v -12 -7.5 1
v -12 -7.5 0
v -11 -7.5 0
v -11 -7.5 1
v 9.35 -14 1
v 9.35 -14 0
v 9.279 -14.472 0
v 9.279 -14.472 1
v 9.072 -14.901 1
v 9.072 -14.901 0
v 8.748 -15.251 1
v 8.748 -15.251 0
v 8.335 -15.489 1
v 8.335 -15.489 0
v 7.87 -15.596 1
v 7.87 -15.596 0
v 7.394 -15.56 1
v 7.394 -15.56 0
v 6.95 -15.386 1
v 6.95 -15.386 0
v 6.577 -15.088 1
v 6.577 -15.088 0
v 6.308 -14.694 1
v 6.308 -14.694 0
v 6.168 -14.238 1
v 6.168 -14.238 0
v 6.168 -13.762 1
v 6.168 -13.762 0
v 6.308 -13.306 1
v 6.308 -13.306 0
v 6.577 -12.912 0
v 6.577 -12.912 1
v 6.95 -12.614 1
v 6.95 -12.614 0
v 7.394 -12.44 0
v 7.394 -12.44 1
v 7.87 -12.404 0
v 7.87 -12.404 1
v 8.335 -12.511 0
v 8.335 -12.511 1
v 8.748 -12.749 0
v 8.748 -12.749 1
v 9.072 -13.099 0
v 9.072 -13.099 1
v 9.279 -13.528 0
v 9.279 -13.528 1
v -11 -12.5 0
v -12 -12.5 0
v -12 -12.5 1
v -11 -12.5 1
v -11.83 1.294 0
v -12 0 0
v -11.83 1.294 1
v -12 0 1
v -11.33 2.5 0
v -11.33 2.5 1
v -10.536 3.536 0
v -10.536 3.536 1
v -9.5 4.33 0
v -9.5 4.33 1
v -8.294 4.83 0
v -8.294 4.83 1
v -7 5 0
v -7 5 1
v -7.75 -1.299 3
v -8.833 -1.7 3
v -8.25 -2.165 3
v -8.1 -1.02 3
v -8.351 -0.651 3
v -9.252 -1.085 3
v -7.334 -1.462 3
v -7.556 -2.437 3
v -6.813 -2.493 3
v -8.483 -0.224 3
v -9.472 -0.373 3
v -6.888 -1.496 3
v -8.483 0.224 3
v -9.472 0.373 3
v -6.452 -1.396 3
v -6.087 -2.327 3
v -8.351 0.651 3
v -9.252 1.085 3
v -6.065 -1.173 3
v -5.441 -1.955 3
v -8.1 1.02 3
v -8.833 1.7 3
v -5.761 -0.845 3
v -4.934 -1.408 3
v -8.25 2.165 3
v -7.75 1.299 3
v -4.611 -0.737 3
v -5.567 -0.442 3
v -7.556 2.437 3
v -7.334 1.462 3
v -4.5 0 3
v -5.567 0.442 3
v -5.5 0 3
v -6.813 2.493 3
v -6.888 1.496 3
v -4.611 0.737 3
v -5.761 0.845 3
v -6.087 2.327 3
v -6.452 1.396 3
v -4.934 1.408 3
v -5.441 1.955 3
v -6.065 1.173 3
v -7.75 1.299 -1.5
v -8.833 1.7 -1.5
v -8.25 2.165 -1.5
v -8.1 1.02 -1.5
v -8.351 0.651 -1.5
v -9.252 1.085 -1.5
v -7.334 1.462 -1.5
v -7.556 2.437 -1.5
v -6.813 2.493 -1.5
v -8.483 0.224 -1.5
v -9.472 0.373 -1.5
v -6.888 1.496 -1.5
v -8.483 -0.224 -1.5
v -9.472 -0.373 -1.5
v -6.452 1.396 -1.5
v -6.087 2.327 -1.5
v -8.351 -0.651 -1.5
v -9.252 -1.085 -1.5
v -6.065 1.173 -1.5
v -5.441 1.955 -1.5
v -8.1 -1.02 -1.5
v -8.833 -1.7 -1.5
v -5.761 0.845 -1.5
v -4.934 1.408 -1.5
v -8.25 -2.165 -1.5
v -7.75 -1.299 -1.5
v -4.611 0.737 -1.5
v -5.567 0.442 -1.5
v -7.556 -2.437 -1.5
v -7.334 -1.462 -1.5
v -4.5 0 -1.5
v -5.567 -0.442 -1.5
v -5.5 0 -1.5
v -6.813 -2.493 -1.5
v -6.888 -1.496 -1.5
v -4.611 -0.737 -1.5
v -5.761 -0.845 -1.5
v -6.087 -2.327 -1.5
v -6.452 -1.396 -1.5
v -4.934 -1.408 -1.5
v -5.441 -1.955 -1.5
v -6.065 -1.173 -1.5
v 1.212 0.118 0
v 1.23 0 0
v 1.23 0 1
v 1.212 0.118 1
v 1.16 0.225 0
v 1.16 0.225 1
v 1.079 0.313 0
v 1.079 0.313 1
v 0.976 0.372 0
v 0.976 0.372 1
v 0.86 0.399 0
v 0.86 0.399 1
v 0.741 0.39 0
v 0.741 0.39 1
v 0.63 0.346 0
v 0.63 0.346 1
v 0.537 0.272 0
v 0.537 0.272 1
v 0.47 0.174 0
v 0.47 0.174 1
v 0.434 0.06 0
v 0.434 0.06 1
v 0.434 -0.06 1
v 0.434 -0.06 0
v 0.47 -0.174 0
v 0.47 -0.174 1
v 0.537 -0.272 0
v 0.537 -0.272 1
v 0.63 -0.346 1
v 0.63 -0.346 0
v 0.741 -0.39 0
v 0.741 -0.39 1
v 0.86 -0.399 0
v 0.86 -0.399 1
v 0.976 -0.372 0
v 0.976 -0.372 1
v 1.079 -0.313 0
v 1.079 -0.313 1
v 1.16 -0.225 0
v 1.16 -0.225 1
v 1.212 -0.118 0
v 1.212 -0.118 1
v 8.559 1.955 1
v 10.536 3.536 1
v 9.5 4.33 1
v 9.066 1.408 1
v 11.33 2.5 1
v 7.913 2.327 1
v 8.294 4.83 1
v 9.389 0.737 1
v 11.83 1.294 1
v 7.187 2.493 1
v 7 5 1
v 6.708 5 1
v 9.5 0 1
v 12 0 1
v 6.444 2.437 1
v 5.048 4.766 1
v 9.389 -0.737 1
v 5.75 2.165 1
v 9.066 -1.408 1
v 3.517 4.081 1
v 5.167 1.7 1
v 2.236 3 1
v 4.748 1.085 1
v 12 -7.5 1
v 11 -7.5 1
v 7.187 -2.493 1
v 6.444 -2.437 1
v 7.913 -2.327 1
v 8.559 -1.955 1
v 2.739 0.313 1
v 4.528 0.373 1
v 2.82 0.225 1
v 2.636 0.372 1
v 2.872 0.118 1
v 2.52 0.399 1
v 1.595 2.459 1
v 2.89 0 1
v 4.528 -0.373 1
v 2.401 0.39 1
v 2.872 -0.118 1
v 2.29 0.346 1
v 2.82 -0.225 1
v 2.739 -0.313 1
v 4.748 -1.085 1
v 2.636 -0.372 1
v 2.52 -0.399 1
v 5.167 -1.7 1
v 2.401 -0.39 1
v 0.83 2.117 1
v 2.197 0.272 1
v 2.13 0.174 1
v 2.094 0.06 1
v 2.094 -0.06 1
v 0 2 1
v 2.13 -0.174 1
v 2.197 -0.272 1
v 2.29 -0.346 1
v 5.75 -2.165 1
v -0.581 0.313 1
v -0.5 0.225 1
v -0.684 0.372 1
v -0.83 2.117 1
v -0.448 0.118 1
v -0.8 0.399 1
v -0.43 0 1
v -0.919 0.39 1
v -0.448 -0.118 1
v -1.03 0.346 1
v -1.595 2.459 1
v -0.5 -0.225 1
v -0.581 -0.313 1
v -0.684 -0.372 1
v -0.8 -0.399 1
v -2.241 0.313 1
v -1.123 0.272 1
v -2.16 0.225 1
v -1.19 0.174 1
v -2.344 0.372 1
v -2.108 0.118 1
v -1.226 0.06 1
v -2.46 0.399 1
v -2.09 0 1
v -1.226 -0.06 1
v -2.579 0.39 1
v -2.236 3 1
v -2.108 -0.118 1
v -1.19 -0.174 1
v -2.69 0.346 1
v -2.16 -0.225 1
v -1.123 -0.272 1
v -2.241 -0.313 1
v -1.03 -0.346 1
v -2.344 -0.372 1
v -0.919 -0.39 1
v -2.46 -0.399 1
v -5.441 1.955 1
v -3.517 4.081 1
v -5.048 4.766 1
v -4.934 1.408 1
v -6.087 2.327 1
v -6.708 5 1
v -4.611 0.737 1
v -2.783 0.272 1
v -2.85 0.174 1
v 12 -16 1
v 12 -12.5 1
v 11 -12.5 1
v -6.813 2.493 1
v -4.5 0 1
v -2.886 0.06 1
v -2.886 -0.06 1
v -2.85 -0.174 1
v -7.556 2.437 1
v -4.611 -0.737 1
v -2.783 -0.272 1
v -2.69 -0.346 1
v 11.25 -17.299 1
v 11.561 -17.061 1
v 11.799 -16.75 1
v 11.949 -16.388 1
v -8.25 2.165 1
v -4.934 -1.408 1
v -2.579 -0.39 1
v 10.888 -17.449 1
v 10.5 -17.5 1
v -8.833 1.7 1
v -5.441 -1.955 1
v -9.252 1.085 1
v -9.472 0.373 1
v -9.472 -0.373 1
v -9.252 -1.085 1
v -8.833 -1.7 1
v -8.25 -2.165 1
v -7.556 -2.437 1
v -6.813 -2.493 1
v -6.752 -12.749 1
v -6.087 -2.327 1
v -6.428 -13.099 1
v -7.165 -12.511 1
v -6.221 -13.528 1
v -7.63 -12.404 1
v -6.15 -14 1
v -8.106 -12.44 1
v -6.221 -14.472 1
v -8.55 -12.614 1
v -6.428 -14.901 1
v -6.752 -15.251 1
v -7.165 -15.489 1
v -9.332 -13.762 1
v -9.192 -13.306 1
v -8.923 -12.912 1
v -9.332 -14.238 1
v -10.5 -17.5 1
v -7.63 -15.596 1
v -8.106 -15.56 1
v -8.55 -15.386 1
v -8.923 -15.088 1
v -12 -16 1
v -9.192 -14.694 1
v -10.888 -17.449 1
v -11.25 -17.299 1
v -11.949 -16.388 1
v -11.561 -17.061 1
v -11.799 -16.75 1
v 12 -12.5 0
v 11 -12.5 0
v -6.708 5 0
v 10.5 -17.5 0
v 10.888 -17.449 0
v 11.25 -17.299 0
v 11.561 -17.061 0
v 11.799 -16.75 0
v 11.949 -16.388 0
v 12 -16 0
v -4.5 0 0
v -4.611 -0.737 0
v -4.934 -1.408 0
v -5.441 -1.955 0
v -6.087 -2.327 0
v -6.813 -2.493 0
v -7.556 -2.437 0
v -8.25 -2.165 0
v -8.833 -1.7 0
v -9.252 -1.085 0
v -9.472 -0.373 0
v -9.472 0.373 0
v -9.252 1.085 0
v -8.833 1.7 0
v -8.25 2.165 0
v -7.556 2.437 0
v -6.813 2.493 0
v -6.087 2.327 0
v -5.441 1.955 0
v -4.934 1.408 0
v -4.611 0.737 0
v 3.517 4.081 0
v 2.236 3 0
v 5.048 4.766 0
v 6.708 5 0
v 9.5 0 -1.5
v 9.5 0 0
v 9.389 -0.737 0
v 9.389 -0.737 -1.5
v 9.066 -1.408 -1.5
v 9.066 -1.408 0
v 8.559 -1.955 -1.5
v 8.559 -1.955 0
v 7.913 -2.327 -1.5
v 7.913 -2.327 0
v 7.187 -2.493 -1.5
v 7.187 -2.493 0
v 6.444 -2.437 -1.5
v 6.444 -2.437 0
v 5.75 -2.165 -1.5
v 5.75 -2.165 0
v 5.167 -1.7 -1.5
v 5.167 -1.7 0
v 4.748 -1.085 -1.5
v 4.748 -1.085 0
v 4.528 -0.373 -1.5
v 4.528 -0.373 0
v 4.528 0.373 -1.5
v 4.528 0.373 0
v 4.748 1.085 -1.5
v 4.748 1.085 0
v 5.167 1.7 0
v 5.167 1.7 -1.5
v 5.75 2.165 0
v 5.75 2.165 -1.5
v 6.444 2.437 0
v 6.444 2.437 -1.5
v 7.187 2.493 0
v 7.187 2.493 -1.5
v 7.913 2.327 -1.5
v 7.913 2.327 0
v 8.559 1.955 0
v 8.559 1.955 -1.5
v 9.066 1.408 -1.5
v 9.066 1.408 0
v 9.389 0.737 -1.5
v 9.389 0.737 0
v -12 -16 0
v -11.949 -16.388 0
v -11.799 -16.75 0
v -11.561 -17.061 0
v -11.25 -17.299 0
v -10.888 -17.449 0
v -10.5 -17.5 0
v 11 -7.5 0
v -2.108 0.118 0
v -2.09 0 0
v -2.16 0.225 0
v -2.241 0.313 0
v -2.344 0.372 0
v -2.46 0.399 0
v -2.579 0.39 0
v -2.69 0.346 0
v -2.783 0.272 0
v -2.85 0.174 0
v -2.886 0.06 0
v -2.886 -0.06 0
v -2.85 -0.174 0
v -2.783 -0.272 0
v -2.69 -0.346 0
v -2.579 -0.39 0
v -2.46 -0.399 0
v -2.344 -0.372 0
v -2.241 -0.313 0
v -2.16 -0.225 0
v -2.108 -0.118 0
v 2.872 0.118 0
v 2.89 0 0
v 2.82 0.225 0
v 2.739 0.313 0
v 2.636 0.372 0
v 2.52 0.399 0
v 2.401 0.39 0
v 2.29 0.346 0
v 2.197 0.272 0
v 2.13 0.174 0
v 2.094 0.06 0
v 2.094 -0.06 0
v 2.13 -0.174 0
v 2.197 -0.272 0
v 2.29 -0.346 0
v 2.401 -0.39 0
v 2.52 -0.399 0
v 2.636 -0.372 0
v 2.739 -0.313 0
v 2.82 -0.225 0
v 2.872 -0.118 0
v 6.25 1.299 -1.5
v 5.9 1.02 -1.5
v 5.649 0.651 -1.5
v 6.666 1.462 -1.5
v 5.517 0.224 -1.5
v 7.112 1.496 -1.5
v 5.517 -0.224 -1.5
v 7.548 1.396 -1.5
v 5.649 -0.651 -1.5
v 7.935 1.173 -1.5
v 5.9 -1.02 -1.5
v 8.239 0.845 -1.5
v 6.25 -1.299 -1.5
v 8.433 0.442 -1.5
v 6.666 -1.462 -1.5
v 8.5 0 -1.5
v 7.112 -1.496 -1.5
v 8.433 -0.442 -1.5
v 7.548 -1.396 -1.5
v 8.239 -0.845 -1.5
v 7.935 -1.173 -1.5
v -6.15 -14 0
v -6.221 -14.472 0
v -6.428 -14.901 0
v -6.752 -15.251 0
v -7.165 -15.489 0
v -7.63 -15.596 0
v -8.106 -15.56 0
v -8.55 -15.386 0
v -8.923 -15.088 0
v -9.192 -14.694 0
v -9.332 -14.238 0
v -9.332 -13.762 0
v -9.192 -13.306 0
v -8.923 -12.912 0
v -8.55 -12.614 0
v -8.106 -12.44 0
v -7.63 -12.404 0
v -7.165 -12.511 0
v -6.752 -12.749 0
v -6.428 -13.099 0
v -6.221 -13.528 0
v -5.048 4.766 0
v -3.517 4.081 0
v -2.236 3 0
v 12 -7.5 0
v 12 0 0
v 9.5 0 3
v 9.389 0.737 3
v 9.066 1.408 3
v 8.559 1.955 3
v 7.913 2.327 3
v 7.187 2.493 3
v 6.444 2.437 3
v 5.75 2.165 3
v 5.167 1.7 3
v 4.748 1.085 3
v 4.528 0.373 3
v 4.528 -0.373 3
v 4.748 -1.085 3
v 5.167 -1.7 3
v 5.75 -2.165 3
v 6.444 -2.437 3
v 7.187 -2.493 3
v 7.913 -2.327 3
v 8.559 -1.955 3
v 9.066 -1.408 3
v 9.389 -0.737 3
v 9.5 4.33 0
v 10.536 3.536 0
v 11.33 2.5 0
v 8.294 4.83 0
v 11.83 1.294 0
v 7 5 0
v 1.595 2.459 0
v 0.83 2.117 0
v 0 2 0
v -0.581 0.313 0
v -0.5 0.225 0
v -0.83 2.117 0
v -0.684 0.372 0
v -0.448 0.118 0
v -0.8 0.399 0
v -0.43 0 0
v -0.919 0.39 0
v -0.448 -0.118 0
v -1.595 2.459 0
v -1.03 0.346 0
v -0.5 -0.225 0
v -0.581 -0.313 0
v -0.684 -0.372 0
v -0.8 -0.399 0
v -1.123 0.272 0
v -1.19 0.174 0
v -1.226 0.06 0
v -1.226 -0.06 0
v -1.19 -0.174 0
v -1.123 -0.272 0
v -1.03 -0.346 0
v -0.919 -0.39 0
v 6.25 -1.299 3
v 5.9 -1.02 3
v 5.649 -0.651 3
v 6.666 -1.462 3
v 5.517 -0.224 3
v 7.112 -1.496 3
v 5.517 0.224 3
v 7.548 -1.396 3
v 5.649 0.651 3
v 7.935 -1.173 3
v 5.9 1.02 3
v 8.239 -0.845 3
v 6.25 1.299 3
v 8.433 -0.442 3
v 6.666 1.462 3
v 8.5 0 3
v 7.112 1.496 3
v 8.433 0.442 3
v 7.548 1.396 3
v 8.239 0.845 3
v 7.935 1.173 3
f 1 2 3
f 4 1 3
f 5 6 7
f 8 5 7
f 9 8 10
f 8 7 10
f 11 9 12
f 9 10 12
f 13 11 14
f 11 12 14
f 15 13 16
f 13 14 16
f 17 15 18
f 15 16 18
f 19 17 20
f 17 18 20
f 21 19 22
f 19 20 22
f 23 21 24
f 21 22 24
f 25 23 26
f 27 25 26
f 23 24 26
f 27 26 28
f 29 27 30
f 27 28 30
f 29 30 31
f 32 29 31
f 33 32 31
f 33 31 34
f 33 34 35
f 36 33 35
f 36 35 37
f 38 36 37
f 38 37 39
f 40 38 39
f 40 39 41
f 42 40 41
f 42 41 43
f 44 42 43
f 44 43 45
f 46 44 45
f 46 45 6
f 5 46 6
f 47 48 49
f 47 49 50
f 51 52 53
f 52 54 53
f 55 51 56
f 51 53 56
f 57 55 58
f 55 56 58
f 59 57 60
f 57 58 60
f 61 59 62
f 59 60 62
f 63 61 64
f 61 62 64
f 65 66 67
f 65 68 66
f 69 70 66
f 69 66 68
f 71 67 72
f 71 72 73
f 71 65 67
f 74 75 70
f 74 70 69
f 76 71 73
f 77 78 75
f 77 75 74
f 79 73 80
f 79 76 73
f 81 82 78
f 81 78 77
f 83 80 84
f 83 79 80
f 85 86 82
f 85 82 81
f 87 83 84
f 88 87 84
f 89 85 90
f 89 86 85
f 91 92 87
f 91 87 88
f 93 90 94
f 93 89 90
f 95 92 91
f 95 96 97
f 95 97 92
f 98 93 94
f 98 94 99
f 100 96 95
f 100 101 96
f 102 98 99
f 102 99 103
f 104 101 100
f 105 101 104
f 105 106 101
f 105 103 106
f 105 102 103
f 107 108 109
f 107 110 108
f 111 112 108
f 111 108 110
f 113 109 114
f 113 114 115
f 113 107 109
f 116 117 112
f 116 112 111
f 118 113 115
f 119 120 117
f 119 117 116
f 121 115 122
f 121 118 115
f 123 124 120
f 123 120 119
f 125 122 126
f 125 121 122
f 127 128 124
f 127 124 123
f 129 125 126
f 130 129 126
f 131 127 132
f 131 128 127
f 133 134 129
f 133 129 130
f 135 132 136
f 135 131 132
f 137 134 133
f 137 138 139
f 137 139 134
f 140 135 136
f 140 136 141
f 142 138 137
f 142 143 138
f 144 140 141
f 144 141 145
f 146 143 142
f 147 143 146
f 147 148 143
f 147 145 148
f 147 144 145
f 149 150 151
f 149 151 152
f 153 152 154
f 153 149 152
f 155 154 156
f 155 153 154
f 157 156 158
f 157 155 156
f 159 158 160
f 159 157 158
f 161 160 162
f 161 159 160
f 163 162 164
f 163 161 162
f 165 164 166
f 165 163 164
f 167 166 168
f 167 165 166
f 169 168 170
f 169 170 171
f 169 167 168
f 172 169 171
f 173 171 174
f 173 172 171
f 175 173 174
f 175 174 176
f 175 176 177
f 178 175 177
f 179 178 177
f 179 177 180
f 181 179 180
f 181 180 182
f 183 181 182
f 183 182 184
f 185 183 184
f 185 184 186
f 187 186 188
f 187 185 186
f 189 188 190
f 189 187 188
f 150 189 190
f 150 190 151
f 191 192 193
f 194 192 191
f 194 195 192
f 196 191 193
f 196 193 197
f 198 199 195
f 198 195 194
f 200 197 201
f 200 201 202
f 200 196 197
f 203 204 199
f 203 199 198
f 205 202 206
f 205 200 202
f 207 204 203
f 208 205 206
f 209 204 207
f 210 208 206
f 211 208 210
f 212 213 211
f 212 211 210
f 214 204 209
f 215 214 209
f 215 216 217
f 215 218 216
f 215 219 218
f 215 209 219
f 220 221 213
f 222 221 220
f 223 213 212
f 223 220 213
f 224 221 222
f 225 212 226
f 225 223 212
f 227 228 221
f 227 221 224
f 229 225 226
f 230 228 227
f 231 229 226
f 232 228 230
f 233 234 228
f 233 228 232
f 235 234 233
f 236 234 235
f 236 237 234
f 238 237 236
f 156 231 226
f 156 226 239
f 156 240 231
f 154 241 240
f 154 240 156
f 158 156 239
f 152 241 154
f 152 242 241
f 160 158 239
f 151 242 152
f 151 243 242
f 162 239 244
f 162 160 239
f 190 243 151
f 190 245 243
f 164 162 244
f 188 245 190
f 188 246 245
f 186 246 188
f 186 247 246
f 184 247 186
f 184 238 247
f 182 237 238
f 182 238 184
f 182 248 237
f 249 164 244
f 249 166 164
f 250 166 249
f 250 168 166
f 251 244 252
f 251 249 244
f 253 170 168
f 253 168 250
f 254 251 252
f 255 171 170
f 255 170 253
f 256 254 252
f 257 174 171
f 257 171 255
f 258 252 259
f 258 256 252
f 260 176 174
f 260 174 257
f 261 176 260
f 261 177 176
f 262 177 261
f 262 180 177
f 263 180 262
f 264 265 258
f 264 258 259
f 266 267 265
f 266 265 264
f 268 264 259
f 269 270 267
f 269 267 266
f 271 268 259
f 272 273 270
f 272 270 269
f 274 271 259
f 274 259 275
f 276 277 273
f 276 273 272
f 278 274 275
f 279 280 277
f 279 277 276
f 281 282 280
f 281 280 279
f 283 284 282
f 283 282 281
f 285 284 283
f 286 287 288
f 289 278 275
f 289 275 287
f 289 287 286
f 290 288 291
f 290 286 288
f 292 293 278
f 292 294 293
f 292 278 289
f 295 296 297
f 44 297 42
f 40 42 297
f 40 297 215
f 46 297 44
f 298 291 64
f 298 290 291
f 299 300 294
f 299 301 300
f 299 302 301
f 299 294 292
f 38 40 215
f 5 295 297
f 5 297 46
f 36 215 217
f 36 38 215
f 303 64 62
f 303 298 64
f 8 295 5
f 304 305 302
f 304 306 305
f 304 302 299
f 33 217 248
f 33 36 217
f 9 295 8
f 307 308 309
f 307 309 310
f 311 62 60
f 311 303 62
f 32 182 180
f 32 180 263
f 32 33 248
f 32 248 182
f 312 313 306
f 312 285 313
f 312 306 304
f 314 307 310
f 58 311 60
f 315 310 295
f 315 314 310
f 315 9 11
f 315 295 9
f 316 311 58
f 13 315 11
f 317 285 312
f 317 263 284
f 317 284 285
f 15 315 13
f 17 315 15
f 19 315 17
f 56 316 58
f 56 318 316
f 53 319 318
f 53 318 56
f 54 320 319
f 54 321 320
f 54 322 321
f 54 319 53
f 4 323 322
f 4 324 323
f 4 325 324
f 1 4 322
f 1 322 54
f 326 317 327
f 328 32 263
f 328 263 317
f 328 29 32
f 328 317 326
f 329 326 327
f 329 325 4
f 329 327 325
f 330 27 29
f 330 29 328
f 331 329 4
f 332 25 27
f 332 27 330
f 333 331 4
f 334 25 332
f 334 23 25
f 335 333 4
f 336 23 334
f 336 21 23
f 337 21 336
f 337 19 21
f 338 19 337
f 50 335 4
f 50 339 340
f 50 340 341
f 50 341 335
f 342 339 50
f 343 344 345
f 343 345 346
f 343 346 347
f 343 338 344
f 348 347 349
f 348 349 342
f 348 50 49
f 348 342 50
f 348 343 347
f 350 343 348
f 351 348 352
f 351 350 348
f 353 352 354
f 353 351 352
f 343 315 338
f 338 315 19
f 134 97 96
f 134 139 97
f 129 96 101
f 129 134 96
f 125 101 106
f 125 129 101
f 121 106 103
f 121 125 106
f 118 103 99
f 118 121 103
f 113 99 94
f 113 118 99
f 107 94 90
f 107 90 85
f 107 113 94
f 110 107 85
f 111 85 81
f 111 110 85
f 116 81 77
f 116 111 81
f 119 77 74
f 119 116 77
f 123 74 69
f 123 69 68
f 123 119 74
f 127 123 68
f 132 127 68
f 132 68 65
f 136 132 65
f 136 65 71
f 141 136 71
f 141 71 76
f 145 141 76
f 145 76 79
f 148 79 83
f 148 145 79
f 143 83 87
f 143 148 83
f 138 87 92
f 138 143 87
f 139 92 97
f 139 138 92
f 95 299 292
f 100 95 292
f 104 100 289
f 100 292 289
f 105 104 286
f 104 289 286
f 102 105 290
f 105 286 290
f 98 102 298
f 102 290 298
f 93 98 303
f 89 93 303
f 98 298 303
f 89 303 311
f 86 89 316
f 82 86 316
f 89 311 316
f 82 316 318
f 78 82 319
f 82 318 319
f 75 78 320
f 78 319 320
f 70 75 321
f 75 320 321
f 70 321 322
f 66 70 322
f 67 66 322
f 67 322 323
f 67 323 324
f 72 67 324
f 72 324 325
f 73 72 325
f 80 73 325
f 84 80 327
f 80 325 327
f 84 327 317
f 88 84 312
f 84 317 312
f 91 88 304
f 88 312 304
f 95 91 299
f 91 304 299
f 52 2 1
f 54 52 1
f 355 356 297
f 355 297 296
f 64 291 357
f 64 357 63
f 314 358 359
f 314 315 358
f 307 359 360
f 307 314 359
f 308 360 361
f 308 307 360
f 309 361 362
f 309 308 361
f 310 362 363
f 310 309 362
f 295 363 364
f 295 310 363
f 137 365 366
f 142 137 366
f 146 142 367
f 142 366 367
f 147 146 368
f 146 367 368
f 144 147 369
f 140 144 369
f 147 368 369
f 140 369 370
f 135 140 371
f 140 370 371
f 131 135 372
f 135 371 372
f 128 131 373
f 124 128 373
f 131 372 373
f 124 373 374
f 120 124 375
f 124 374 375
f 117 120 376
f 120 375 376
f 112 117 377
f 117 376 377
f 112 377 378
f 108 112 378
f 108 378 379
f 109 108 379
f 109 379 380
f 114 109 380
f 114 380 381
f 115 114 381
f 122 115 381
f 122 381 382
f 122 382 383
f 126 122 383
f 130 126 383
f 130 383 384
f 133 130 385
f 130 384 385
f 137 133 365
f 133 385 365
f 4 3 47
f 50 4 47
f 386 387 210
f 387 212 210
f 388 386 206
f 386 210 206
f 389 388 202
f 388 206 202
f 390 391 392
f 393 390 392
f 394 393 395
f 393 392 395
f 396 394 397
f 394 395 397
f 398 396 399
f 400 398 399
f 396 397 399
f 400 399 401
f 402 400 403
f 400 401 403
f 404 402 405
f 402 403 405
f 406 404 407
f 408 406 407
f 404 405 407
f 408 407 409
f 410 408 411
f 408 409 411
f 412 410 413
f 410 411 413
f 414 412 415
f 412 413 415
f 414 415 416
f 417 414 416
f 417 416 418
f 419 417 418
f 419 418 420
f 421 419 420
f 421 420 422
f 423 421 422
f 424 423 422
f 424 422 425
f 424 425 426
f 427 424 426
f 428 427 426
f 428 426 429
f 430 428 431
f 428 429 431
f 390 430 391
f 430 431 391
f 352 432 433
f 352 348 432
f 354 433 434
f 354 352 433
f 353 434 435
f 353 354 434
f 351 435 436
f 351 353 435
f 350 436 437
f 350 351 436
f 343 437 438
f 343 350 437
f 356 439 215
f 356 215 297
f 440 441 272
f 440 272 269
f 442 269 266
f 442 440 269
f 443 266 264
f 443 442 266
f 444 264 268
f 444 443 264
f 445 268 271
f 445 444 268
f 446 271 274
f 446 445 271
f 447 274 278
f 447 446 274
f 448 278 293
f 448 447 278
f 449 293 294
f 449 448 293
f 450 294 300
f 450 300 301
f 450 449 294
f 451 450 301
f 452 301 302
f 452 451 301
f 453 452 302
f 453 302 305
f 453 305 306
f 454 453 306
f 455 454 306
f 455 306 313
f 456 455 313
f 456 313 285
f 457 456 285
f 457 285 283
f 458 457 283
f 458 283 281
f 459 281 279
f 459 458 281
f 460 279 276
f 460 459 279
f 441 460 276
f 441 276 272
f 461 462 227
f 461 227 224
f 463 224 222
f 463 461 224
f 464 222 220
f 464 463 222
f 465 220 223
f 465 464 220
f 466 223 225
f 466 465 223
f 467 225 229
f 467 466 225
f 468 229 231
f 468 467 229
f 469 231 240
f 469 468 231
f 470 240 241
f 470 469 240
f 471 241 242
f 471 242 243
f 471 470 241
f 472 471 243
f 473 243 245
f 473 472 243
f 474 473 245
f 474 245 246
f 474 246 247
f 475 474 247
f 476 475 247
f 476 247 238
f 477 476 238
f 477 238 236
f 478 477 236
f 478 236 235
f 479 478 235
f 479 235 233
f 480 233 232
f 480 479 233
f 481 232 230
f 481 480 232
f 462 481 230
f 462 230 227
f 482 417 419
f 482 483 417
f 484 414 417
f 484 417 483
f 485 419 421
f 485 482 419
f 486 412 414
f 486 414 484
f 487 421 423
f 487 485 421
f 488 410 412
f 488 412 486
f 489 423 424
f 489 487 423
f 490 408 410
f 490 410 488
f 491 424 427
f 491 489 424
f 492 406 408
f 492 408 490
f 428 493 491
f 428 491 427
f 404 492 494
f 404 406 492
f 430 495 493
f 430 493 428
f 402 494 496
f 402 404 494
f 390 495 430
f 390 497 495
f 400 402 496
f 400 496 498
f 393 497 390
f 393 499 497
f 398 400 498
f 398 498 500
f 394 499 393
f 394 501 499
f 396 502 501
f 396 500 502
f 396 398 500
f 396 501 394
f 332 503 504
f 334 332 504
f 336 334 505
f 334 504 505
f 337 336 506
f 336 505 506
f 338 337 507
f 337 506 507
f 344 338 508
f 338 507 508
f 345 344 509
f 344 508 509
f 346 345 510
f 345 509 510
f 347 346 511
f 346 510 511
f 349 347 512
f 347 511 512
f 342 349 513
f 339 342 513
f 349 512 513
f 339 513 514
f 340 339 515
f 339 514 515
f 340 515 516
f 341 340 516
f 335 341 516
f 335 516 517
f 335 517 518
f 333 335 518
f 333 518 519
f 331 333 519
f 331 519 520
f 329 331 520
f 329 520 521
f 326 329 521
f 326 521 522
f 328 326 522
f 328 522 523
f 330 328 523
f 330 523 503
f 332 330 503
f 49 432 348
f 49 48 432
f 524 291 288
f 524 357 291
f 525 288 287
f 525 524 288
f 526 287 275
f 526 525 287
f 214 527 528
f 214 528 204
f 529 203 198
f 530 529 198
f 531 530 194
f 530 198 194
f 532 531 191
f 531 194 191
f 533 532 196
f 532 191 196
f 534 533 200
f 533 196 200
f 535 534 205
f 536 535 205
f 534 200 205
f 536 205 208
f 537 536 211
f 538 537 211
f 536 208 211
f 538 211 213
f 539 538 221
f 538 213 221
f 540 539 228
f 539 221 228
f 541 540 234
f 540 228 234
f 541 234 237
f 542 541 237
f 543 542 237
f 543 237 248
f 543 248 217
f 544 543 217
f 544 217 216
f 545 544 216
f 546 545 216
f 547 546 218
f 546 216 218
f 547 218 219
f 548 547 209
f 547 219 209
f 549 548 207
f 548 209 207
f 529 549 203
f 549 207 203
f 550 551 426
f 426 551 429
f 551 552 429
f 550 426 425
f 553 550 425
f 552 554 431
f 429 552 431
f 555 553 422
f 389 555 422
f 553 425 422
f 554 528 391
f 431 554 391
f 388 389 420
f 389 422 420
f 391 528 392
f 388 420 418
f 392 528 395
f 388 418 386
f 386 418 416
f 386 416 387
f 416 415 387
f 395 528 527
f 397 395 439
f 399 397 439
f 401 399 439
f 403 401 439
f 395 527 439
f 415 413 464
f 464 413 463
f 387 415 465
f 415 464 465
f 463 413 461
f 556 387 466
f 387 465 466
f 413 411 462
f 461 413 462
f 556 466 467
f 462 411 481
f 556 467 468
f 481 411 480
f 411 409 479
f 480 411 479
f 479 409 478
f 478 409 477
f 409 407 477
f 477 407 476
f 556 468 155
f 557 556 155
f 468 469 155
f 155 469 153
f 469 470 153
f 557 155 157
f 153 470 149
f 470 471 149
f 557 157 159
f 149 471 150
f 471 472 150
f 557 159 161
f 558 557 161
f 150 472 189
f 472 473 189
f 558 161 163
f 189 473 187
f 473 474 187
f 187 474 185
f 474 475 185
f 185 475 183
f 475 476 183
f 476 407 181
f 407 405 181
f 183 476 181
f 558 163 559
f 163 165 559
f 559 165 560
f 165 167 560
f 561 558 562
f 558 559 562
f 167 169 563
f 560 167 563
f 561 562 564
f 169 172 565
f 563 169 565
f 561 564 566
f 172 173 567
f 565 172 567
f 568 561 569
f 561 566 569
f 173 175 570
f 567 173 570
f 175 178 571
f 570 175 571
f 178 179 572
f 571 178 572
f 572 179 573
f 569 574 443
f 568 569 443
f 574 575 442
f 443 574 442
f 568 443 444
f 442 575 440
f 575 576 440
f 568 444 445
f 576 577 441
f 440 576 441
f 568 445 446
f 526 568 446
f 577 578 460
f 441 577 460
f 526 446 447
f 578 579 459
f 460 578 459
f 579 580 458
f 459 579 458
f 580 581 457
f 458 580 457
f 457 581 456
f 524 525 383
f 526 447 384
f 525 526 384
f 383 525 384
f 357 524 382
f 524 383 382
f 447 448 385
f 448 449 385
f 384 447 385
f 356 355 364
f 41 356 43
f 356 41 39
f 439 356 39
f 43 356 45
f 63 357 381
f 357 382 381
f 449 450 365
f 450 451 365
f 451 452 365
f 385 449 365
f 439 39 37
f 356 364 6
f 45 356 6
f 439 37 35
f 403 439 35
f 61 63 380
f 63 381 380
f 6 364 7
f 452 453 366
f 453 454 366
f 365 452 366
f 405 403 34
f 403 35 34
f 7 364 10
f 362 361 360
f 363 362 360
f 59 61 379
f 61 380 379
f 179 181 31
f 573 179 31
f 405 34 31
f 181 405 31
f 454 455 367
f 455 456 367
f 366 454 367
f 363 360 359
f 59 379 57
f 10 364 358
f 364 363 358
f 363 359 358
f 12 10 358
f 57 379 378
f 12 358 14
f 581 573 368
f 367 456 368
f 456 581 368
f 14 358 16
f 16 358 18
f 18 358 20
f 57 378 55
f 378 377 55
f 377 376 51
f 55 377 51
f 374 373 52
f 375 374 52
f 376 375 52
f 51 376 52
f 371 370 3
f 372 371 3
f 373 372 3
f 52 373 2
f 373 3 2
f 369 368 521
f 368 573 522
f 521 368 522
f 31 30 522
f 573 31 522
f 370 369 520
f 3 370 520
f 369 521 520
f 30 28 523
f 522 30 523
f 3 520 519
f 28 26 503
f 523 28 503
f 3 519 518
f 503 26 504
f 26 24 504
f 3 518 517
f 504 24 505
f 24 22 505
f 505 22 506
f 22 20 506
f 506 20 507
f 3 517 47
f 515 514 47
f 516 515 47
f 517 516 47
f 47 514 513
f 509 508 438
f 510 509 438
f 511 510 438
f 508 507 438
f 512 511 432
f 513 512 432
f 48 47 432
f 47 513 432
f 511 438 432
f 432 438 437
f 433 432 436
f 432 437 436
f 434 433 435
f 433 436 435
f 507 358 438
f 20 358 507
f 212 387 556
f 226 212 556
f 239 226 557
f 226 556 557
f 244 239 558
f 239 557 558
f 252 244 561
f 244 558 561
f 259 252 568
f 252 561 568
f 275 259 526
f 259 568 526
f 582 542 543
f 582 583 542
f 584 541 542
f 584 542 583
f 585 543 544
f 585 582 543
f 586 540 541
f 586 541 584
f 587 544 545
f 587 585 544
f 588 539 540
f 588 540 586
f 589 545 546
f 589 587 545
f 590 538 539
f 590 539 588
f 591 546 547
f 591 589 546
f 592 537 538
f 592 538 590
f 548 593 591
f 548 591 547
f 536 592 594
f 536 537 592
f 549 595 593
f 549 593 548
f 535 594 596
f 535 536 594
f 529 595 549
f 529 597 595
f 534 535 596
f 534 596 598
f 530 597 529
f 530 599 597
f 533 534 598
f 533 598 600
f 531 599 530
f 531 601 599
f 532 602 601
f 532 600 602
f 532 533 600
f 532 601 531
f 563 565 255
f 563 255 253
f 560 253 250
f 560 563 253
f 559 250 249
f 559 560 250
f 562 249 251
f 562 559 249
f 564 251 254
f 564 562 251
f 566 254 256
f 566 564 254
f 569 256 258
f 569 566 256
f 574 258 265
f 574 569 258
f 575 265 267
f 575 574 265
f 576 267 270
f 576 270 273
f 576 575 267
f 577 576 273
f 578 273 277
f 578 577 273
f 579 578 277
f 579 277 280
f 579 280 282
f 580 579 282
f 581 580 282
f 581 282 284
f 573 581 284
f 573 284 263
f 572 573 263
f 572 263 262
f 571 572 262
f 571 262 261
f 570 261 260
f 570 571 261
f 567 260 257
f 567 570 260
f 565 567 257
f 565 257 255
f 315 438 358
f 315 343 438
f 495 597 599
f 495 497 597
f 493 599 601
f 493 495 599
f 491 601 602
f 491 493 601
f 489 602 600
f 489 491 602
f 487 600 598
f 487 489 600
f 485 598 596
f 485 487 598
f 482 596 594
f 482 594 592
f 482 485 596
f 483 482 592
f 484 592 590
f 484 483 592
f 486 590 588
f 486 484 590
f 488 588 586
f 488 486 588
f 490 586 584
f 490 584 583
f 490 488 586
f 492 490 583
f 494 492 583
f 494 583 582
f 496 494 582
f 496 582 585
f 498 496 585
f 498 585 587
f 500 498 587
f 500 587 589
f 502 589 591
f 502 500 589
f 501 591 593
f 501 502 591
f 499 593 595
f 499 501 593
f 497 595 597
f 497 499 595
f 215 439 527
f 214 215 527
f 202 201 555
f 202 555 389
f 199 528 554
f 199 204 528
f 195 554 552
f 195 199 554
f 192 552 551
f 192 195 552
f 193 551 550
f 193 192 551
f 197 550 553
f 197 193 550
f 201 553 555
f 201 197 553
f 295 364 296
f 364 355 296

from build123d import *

# Parameters (mm, degrees)
F0_W      = 24
F0_H      = 5
F0_R      = 1.5
F0_R_2    = 0.4
F1_DEPTH  = 1
F2_W      = 24
F2_H      = 1
F3_DEPTH  = 15
F4_R      = 1.6
F5_DEPTH  = 25
F6_R      = 1.5
F7_W      = 1
F7_H      = 5
F8_DEPTH  = 1
F9_W      = 24
F9_H      = 1
F10_DEPTH = 2.5
F11_R     = 5
F12_R     = 2.5
F12_R_2   = 1.5
F13_DEPTH = 1.5
F14_R     = 2.5
F14_R_2   = 1.5
F15_DEPTH = 2
F16_R     = 3
F17_DEPTH = 25
F18_R     = 6


with BuildPart() as f1:
    # F0 (on Top) → F1 (new body)
    with BuildSketch(Plane.XY):
        Rectangle(F0_W, F0_H)
        with Locations((-7, 0)):
            Circle(F0_R, mode=Mode.SUBTRACT)
        with Locations((-2.49, 0)):
            Circle(F0_R_2, mode=Mode.SUBTRACT)
        with Locations((-0.83, 0)):
            Circle(F0_R_2, mode=Mode.SUBTRACT)
        with Locations((0.83, 0)):
            Circle(F0_R_2, mode=Mode.SUBTRACT)
        with Locations((2.49, 0)):
            Circle(F0_R_2, mode=Mode.SUBTRACT)
        with Locations((7, 0)):
            Circle(F0_R, mode=Mode.SUBTRACT)
    extrude(amount=F1_DEPTH)

    # F2 (on face) → F3 (join)
    with BuildSketch(Plane.XZ.offset(2.5)):
        with Locations((0, 0.5)):
            Rectangle(F2_W, F2_H)
    extrude(amount=F3_DEPTH)

    # F4 (on face) → F5 (cut)
    with BuildSketch(Plane(origin=(0, 0, 0), x_dir=(1, 0, 0), z_dir=(0, 0, -1))):
        with Locations((-7.75, 14)):
            Circle(F4_R)
        with Locations((7.75, 14)):
            Circle(F4_R)
    extrude(amount=-F5_DEPTH, mode=Mode.SUBTRACT)

    # F6
    f6_edges = [f1.edges().sort_by_distance(p)[0] for p in [
        (12, -17.5, 0.5),
        (-12, -17.5, 0.5),
    ]]
    fillet(f6_edges, radius=F6_R)

    # F7 (on face) → F8 (cut, through all)
    with BuildSketch(Plane(origin=(0, 0, 0), x_dir=(1, 0, 0), z_dir=(0, 0, -1))):
        with Locations((11.5, 10)):
            Rectangle(F7_W, F7_H)
        with Locations((-11.5, 10)):
            Rectangle(F7_W, F7_H)
    extrude(amount=-F8_DEPTH, mode=Mode.SUBTRACT)

    # F9 (on face) → F10 (join)
    with BuildSketch(Plane(origin=(0, 2.5, 0), x_dir=(-1, 0, 0), z_dir=(0, 1, 0))):
        with Locations((0, 0.5)):
            Rectangle(F9_W, F9_H)
    extrude(amount=F10_DEPTH)

    # F11
    f11_edges = [f1.edges().sort_by_distance(p)[0] for p in [
        (-12, 5, 0.5),
        (12, 5, 0.5),
    ]]
    fillet(f11_edges, radius=F11_R)

    # F12 (on face) → F13 (join)
    with BuildSketch(Plane(origin=(0, 0, 0), x_dir=(1, 0, 0), z_dir=(0, 0, -1))):
        with Locations((7, 0)):
            Circle(F12_R)
        with Locations((7, 0)):
            Circle(F12_R_2, mode=Mode.SUBTRACT)
        with Locations((-7, 0)):
            Circle(F12_R)
        with Locations((-7, 0)):
            Circle(F12_R_2, mode=Mode.SUBTRACT)
    extrude(amount=F13_DEPTH)

    # F14 (on face) → F15 (join)
    with BuildSketch(Plane.XY.offset(1)):
        with Locations((7, 0)):
            Circle(F14_R)
        with Locations((7, 0)):
            Circle(F14_R_2, mode=Mode.SUBTRACT)
        with Locations((-7, 0)):
            Circle(F14_R)
        with Locations((-7, 0)):
            Circle(F14_R_2, mode=Mode.SUBTRACT)
    extrude(amount=F15_DEPTH)

    # F16 (on face) → F17 (cut)
    with BuildSketch(Plane(origin=(0, 0, 0), x_dir=(1, 0, 0), z_dir=(0, 0, -1))):
        with Locations((0, -5)):
            Circle(F16_R)
    extrude(amount=-F17_DEPTH, mode=Mode.SUBTRACT)

    # F18
    f18_edges = [f1.edges().sort_by_distance(p)[0] for p in [
        (-3, 5, 0.5),
        (3, 5, 0.5),
    ]]
    fillet(f18_edges, radius=F18_R)


solid = f1.part
